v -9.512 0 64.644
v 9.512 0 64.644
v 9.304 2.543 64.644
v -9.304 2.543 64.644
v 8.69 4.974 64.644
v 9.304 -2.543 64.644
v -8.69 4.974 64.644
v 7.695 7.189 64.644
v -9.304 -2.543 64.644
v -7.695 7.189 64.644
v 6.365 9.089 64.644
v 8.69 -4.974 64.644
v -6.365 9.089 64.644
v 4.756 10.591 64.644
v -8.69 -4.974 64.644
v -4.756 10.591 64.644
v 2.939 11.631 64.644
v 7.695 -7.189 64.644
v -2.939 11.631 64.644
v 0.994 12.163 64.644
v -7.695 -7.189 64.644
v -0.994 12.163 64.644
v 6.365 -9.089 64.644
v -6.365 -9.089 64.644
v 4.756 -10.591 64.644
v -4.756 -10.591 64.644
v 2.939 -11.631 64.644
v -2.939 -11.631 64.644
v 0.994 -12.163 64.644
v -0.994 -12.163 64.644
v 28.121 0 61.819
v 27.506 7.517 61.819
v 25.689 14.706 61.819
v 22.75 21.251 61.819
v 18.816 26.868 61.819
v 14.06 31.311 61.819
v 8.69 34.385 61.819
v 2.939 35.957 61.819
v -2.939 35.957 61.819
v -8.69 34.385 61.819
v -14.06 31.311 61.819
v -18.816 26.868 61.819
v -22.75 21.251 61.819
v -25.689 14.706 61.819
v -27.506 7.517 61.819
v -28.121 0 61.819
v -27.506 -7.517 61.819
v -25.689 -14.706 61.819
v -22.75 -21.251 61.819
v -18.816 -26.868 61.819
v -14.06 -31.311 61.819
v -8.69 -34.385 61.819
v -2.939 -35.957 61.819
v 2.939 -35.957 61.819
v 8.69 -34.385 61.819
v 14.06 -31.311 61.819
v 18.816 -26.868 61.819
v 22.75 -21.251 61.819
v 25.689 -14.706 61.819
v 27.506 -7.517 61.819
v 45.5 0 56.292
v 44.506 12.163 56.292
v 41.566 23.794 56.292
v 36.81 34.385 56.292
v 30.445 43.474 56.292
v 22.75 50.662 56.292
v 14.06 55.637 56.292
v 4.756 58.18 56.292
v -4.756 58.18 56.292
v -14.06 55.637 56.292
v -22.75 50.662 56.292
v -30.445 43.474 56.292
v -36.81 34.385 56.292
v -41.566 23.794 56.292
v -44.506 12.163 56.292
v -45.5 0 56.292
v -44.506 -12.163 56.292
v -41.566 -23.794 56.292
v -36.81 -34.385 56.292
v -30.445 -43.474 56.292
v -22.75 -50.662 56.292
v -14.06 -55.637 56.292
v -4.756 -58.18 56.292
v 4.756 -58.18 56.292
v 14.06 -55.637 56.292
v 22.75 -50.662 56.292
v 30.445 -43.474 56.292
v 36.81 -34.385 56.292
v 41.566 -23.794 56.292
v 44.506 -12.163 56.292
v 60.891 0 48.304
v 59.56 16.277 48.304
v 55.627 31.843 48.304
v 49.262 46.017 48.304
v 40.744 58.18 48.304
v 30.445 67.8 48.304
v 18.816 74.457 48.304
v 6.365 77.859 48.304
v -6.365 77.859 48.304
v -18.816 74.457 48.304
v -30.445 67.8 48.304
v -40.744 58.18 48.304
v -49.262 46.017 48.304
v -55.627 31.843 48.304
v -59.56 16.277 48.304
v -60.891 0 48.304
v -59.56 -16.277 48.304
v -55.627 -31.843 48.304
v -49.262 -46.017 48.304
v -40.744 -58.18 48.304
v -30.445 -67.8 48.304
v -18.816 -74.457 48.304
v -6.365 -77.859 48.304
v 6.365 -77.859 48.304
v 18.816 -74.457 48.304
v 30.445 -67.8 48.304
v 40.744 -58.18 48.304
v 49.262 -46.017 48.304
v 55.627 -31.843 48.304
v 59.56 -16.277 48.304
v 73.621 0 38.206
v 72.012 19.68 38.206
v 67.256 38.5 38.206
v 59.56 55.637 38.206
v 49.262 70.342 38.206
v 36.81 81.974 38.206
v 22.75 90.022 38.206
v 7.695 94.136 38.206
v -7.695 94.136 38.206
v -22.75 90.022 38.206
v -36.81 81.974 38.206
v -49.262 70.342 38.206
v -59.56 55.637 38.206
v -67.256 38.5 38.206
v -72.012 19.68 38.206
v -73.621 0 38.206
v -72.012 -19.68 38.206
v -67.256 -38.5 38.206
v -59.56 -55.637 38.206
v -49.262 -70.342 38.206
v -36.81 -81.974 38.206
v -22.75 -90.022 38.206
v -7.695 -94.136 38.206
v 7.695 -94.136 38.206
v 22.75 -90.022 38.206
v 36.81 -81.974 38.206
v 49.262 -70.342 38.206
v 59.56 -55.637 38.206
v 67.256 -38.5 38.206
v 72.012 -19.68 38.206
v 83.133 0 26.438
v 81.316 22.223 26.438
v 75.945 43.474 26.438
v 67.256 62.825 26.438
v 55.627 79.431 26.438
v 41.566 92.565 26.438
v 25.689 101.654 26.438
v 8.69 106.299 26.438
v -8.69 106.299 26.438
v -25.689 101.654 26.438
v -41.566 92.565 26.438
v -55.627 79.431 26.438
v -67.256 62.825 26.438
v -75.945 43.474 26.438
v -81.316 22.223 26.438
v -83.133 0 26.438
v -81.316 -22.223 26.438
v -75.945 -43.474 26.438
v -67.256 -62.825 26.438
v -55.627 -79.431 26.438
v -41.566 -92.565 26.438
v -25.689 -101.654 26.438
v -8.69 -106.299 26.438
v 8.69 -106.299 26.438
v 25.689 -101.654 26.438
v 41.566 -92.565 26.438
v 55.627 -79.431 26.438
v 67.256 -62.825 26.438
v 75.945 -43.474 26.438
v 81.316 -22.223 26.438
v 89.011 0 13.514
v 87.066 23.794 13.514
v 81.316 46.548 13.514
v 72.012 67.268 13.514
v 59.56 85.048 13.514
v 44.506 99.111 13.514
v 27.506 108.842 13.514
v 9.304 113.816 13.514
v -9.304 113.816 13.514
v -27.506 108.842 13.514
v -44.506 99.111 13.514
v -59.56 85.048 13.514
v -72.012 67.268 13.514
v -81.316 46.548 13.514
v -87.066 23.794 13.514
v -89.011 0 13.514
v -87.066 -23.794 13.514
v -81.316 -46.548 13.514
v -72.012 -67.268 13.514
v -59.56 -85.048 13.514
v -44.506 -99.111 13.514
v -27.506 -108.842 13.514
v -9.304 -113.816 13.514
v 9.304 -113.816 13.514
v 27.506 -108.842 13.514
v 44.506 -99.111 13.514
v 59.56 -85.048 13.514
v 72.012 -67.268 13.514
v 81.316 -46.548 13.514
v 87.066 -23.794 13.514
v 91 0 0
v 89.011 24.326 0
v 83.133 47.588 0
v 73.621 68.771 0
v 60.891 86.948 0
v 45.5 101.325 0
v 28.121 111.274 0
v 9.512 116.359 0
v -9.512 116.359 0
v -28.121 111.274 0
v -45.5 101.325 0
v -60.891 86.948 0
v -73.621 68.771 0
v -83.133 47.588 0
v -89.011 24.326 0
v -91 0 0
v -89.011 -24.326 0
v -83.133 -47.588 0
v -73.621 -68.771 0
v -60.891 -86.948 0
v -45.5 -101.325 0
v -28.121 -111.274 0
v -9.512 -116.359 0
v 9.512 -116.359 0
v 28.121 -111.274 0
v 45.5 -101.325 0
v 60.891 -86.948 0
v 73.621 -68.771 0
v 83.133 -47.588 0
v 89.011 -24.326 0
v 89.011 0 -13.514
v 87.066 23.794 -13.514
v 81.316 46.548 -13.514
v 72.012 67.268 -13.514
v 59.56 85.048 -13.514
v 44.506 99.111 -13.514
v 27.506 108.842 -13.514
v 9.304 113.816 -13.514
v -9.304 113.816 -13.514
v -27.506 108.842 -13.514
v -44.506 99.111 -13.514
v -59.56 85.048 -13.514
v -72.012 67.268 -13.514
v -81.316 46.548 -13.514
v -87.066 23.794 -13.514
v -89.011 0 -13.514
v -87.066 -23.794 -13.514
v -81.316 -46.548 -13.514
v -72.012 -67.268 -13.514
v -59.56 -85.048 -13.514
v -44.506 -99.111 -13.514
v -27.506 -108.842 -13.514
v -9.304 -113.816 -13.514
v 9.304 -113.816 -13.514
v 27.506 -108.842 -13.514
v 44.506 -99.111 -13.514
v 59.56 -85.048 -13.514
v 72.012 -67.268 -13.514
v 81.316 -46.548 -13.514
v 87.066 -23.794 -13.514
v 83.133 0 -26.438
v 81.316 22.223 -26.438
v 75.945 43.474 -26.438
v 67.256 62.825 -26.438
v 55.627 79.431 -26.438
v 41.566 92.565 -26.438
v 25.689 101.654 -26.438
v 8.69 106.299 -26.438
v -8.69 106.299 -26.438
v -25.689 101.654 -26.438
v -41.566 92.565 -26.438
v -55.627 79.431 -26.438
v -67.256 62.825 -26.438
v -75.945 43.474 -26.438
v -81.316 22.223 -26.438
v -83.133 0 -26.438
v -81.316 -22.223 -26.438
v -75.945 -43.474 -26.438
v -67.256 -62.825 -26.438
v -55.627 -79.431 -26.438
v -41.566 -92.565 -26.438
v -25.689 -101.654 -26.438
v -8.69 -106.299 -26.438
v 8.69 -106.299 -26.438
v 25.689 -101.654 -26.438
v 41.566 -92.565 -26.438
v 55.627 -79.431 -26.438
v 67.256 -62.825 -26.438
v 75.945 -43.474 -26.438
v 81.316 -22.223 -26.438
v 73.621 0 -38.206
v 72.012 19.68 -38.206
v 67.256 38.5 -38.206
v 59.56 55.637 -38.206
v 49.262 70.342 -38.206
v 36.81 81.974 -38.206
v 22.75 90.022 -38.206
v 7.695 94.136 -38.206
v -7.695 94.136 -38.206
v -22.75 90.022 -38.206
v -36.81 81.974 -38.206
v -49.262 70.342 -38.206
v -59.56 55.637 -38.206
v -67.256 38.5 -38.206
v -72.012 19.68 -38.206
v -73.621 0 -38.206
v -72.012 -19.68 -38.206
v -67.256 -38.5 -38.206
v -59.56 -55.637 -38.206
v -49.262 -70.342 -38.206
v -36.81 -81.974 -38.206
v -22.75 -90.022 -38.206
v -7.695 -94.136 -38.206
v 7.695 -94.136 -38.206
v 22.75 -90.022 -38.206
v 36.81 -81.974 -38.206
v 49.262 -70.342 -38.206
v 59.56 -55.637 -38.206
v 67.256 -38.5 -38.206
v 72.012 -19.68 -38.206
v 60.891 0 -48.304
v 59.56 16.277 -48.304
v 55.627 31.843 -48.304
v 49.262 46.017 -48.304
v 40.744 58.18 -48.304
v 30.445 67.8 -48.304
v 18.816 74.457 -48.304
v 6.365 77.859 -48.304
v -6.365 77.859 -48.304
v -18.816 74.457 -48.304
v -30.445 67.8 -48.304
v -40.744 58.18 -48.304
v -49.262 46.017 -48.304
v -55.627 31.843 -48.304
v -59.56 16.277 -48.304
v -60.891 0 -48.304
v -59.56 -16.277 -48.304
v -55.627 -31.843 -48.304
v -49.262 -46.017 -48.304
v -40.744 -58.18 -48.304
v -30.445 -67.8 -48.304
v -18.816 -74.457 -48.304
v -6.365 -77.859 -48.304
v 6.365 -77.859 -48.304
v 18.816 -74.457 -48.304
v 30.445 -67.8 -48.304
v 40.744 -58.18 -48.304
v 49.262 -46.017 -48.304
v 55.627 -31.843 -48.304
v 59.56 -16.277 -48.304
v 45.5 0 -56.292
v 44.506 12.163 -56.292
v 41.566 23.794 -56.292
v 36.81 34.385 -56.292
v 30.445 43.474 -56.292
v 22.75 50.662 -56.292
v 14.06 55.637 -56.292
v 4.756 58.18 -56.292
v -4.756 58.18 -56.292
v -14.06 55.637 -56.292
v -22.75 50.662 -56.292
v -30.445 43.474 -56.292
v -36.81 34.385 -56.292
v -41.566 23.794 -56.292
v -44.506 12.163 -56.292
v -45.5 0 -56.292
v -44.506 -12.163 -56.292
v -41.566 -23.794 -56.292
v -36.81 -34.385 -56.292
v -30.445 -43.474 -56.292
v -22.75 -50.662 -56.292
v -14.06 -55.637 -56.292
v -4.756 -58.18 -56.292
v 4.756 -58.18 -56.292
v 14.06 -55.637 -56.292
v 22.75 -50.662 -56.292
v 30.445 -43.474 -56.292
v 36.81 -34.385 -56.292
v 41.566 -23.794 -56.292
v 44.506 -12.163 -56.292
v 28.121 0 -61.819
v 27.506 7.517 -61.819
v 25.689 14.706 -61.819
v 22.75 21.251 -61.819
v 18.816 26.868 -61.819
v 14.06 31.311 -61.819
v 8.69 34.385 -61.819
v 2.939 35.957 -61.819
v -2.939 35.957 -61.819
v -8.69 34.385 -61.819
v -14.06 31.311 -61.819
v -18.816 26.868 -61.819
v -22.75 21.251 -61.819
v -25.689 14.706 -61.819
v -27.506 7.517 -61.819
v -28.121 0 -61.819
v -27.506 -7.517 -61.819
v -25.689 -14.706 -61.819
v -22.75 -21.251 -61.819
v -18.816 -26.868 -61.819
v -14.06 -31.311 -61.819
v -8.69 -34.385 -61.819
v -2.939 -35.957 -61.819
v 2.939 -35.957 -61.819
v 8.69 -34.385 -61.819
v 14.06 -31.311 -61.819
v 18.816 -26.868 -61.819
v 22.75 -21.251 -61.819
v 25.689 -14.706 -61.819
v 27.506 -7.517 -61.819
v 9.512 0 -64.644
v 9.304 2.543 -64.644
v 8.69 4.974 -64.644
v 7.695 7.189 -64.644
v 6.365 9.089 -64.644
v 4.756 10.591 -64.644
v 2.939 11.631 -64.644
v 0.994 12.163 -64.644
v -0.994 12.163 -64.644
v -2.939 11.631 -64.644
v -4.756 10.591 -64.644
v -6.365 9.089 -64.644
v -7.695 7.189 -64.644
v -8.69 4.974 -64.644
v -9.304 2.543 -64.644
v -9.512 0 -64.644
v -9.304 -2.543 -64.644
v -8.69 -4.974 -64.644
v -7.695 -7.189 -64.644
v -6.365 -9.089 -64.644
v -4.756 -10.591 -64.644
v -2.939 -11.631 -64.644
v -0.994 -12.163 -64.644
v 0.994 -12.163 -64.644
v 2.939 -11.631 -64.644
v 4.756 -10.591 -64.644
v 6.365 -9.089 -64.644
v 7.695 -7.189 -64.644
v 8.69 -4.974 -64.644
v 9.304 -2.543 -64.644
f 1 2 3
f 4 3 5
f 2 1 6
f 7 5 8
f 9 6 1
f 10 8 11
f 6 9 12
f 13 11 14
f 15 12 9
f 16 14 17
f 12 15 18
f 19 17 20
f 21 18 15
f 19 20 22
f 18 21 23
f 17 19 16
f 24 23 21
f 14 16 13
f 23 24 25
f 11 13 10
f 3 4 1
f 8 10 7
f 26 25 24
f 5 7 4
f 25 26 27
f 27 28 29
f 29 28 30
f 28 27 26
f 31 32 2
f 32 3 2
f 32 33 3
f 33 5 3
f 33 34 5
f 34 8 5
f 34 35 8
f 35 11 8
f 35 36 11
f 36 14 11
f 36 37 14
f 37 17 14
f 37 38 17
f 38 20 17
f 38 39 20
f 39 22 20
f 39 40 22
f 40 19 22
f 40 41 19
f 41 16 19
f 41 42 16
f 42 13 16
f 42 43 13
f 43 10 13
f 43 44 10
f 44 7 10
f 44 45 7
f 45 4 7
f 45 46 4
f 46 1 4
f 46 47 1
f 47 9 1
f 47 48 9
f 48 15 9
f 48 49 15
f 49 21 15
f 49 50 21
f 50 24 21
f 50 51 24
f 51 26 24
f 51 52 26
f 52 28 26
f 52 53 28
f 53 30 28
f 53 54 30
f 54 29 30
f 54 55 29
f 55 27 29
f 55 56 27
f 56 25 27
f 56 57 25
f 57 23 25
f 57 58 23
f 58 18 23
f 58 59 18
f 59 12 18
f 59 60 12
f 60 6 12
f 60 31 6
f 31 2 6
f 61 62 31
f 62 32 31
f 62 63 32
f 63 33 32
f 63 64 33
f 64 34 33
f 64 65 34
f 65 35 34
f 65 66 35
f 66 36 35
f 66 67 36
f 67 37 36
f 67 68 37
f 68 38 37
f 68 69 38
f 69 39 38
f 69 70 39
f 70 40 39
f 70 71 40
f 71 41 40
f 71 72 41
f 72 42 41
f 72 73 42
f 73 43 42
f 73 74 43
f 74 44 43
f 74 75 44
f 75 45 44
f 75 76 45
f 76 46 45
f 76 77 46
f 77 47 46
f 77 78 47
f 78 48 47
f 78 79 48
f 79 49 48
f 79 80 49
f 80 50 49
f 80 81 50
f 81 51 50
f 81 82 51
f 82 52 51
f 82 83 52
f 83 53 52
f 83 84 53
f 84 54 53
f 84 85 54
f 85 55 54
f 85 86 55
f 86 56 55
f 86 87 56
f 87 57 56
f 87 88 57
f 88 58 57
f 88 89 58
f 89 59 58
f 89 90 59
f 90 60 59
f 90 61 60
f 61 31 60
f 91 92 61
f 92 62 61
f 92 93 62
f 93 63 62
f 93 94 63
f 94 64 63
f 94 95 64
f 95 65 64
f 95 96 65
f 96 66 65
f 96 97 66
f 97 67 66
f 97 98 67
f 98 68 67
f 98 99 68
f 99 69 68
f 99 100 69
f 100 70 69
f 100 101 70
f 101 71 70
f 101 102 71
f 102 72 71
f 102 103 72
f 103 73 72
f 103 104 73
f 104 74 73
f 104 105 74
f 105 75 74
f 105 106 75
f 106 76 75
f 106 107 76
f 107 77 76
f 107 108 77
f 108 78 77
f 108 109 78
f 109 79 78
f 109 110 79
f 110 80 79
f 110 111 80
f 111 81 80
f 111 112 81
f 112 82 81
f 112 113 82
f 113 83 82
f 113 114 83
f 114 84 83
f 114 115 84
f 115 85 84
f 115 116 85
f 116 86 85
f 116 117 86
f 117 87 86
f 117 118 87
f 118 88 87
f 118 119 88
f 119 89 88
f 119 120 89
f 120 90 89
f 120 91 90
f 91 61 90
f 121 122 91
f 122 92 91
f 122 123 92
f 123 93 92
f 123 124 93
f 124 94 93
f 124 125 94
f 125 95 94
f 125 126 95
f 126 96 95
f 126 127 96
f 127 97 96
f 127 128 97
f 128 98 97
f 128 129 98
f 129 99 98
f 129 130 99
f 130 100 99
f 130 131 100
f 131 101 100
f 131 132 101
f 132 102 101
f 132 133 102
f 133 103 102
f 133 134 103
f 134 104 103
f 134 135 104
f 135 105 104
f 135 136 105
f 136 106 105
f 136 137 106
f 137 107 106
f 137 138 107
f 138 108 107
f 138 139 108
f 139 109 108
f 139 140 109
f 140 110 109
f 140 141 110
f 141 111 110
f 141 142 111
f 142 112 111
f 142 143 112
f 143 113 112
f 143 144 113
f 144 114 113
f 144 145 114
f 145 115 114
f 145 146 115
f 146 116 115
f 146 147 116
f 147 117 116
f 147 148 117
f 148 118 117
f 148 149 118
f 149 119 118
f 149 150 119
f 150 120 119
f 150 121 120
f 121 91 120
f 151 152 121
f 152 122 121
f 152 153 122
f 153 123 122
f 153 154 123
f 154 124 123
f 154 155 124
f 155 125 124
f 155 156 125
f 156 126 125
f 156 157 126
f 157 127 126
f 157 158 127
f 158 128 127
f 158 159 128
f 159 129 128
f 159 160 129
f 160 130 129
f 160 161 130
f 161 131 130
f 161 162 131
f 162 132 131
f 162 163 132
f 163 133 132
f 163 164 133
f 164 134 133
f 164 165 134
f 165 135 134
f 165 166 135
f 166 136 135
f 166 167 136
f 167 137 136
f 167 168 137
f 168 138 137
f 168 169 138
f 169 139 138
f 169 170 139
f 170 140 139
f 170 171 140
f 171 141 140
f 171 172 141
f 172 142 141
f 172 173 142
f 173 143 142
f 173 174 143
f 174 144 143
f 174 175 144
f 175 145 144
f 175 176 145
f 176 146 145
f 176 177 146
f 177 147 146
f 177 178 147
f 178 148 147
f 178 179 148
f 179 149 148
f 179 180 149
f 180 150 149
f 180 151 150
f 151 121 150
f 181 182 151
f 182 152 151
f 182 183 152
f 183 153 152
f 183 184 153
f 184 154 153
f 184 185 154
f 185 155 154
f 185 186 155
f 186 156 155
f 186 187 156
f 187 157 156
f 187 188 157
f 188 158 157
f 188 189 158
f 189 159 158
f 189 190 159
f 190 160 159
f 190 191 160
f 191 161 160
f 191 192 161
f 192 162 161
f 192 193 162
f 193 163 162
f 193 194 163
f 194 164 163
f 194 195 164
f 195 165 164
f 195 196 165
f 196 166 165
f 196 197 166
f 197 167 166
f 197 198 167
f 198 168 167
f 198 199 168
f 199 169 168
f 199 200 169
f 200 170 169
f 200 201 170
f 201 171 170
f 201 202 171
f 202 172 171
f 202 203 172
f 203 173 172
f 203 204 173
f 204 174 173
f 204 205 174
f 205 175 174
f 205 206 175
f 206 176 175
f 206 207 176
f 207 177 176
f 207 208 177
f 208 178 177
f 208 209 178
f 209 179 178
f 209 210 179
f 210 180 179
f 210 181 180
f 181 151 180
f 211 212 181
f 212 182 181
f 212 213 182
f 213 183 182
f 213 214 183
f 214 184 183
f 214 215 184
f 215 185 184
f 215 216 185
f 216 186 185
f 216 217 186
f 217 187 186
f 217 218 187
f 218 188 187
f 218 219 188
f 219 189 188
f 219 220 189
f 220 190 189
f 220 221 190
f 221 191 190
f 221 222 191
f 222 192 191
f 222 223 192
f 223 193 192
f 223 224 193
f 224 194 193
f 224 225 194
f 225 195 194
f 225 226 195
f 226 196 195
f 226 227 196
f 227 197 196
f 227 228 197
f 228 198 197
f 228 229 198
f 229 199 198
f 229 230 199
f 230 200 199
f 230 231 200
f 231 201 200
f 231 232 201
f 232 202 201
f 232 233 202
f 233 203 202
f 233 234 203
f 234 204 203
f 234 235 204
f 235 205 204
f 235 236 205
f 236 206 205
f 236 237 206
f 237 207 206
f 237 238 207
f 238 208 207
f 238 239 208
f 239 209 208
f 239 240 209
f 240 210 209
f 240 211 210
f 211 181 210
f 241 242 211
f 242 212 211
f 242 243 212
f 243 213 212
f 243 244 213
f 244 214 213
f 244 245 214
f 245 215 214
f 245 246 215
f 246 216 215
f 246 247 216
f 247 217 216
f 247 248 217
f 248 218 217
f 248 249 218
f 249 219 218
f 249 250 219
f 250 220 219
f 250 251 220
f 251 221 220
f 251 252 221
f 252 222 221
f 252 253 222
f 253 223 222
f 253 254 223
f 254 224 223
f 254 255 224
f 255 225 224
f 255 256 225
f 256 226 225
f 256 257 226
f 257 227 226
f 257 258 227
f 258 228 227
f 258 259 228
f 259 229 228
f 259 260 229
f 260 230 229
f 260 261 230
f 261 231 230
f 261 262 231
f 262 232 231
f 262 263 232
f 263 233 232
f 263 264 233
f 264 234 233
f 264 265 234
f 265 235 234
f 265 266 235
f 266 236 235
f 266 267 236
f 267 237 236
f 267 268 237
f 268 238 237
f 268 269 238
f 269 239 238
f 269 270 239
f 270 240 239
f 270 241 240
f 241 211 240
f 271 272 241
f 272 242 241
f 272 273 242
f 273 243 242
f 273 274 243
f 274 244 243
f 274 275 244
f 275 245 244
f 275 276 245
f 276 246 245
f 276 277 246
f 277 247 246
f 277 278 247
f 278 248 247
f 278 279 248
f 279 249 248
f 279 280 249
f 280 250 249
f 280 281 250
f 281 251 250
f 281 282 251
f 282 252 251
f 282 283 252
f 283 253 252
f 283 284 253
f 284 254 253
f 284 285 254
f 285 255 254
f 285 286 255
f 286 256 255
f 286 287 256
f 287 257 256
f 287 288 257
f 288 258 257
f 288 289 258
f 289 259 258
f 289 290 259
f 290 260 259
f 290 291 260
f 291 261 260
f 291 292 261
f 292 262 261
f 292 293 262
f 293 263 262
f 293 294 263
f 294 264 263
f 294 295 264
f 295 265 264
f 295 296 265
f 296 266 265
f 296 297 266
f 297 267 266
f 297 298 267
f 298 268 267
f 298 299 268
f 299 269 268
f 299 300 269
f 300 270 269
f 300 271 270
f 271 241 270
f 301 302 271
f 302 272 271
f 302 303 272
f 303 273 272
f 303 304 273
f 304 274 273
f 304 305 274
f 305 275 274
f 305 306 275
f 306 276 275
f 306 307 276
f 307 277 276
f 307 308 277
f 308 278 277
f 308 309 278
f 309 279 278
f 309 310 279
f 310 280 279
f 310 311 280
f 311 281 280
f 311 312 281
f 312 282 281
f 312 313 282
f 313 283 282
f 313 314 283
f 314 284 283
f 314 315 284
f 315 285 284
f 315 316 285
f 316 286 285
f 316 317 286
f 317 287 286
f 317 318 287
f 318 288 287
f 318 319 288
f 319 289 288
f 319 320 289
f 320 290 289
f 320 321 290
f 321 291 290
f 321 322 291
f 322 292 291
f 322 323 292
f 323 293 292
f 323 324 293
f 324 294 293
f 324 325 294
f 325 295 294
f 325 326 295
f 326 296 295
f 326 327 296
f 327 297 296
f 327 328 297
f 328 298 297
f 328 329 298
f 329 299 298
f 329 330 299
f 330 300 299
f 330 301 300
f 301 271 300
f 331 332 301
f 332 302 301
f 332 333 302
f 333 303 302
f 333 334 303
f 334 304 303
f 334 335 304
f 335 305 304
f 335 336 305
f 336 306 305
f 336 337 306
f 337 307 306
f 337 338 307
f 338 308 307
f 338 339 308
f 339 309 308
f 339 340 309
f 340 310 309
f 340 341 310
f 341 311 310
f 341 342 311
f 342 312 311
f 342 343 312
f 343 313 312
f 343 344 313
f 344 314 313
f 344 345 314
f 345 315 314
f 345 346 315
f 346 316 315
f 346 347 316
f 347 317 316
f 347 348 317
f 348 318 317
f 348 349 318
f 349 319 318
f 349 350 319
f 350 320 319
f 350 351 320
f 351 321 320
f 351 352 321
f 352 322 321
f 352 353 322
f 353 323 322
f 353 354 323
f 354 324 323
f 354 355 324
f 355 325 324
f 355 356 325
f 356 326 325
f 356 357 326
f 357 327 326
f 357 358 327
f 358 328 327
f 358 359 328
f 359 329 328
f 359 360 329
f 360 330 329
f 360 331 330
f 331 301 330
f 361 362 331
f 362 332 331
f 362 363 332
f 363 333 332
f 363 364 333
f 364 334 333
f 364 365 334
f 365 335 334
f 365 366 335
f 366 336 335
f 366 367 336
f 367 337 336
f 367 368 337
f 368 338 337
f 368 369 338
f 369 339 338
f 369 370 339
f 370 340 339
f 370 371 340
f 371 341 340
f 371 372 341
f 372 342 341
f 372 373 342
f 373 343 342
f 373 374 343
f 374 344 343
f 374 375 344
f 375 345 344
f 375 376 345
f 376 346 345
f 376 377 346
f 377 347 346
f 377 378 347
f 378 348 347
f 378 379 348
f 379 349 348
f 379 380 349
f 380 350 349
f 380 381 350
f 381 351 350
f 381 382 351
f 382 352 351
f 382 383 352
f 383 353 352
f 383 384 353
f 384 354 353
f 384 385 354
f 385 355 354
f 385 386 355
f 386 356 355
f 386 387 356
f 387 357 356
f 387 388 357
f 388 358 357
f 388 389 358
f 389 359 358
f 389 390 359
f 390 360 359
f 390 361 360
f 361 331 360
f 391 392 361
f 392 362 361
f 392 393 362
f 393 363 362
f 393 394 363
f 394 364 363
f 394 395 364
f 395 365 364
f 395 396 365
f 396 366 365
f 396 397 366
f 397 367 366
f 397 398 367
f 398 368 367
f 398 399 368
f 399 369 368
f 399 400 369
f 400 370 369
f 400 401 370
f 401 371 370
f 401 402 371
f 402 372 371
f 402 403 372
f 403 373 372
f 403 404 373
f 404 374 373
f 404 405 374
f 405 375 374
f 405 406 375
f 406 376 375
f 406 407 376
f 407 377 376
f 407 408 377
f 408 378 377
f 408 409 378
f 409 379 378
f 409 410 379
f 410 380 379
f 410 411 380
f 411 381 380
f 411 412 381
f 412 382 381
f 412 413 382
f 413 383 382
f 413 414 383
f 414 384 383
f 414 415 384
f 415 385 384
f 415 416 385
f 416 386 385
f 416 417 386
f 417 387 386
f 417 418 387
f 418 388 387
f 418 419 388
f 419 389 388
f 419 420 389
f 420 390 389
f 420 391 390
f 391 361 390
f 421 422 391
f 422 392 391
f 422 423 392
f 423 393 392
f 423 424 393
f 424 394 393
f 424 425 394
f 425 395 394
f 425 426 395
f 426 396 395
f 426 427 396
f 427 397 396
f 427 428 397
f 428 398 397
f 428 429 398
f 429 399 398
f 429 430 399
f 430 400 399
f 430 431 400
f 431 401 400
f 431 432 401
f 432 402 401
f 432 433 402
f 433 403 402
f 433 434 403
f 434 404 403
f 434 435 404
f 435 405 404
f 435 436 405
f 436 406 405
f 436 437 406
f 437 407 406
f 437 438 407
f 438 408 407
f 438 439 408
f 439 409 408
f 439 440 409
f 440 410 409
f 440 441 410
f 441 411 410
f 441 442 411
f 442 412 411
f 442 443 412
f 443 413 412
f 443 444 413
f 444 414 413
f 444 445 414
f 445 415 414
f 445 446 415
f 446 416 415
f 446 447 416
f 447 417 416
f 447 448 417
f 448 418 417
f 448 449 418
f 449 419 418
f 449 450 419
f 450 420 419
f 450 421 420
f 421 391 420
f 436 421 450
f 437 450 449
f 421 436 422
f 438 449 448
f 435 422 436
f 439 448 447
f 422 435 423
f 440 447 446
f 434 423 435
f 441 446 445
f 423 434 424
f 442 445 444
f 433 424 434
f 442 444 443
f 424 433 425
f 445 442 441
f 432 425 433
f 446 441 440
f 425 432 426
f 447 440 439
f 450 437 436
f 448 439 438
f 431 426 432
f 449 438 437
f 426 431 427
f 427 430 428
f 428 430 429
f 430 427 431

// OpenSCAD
// Generated by SolidPython 1.0.1 on 2020-07-29 00:46:47


scale(v = [7, 9, 5]) {
	sphere(r = 13);
}
/***********************************************
*********      SolidPython code:      **********
************************************************
 
# import packages: SolidPython
from solid import *
from solid.utils import *
from itertools import chain, combinations, permutations


class Resize:

    def __init__(self, scad_file):
        self.scad_file = scad_file
        #self.scad_file = import_scad(scad_file)
        # cone/cylinder param:
        self.r1 = 0
        self.r2 = 0
        self.h = 0
        # rectangular prism param:
        self.w = 0
        self.l = 0
        # ellipse param:
        self.r = 0

    # import OpenScad code (file name corresponds to shape)


    # classify shape + parameters
    def assign(self, param1, param2, param3):
        if self.scad_file == 'cone.scad':
            self.r1 = param1
            self.r2 = param2
            self.h = param3
        elif self.scad_file == 'cylinder.scad':
            self.r1 = param1
            self.r2 = param2
            self.h = param3
        elif self.scad_file == 'rectangularPrism.scad':
            self.h = param1
            self.l = param2
            self.w = param3
        else:
            self.r = param1
            self.h = param2

    # resize parameters
    def iterate(self):
        x = range(3, 20, 2)
        i = 1
        if self.scad_file == 'cone.scad':
            tempList = list(permutations(x, 2))
            for temp in tempList:
                param1 = temp[0]
                param2 = temp[1]
                filepath = 'produced_scad_files/' + 'cone' + str(param1) + '_' + str(param2) + '_' + '.scad'
                scad_render_to_file(cylinder(h=param1, r1=param2, r2=0), filepath)

        elif self.scad_file == 'cylinder.scad':
            tempList = list(permutations(x, 3))
            for temp in tempList:
                param1 = temp[0]
                param2 = temp[1]
                filepath = 'produced_scad_files/' + 'cylinder' + str(param1) + '_' + str(param2) + '_' + '.scad'
                scad_render_to_file(cylinder(h=param1, r1=param2, r2=param2), filepath)

        elif self.scad_file == 'rectangularPrism.scad':
            tempList = list(permutations(x, 3))
            for temp in tempList:
                param1 = temp[0]
                param2 = temp[1]
                param3 = temp[2]
                filepath = 'produced_scad_files/' + 'rectangularPrism' + str(param1) + '_' + str(param2) + '_' + str(
                    param3) + '.scad'
                scad_render_to_file(cube(size=(param1, param2, param3)), filepath)

        elif self.scad_file == 'ellipse.scad':
            tempList = list(permutations(x, 4))
            for temp in tempList:
                param1 = temp[0]
                param2 = temp[1]
                param3 = temp[2]
                param4 = temp[3]
                filepath = 'produced_scad_files/' + 'ellipse' + str(param1) + '_' + str(param2) + '_' + str(param3) + '_' + str(param4) + '.scad'
                scad_render_to_file(scale([param1, param2, param3])(sphere(r=param4)), filepath)

    def render_to_scadfile(self):
        scad_render_to_file(scad, 'example.scad') 
 
************************************************/
